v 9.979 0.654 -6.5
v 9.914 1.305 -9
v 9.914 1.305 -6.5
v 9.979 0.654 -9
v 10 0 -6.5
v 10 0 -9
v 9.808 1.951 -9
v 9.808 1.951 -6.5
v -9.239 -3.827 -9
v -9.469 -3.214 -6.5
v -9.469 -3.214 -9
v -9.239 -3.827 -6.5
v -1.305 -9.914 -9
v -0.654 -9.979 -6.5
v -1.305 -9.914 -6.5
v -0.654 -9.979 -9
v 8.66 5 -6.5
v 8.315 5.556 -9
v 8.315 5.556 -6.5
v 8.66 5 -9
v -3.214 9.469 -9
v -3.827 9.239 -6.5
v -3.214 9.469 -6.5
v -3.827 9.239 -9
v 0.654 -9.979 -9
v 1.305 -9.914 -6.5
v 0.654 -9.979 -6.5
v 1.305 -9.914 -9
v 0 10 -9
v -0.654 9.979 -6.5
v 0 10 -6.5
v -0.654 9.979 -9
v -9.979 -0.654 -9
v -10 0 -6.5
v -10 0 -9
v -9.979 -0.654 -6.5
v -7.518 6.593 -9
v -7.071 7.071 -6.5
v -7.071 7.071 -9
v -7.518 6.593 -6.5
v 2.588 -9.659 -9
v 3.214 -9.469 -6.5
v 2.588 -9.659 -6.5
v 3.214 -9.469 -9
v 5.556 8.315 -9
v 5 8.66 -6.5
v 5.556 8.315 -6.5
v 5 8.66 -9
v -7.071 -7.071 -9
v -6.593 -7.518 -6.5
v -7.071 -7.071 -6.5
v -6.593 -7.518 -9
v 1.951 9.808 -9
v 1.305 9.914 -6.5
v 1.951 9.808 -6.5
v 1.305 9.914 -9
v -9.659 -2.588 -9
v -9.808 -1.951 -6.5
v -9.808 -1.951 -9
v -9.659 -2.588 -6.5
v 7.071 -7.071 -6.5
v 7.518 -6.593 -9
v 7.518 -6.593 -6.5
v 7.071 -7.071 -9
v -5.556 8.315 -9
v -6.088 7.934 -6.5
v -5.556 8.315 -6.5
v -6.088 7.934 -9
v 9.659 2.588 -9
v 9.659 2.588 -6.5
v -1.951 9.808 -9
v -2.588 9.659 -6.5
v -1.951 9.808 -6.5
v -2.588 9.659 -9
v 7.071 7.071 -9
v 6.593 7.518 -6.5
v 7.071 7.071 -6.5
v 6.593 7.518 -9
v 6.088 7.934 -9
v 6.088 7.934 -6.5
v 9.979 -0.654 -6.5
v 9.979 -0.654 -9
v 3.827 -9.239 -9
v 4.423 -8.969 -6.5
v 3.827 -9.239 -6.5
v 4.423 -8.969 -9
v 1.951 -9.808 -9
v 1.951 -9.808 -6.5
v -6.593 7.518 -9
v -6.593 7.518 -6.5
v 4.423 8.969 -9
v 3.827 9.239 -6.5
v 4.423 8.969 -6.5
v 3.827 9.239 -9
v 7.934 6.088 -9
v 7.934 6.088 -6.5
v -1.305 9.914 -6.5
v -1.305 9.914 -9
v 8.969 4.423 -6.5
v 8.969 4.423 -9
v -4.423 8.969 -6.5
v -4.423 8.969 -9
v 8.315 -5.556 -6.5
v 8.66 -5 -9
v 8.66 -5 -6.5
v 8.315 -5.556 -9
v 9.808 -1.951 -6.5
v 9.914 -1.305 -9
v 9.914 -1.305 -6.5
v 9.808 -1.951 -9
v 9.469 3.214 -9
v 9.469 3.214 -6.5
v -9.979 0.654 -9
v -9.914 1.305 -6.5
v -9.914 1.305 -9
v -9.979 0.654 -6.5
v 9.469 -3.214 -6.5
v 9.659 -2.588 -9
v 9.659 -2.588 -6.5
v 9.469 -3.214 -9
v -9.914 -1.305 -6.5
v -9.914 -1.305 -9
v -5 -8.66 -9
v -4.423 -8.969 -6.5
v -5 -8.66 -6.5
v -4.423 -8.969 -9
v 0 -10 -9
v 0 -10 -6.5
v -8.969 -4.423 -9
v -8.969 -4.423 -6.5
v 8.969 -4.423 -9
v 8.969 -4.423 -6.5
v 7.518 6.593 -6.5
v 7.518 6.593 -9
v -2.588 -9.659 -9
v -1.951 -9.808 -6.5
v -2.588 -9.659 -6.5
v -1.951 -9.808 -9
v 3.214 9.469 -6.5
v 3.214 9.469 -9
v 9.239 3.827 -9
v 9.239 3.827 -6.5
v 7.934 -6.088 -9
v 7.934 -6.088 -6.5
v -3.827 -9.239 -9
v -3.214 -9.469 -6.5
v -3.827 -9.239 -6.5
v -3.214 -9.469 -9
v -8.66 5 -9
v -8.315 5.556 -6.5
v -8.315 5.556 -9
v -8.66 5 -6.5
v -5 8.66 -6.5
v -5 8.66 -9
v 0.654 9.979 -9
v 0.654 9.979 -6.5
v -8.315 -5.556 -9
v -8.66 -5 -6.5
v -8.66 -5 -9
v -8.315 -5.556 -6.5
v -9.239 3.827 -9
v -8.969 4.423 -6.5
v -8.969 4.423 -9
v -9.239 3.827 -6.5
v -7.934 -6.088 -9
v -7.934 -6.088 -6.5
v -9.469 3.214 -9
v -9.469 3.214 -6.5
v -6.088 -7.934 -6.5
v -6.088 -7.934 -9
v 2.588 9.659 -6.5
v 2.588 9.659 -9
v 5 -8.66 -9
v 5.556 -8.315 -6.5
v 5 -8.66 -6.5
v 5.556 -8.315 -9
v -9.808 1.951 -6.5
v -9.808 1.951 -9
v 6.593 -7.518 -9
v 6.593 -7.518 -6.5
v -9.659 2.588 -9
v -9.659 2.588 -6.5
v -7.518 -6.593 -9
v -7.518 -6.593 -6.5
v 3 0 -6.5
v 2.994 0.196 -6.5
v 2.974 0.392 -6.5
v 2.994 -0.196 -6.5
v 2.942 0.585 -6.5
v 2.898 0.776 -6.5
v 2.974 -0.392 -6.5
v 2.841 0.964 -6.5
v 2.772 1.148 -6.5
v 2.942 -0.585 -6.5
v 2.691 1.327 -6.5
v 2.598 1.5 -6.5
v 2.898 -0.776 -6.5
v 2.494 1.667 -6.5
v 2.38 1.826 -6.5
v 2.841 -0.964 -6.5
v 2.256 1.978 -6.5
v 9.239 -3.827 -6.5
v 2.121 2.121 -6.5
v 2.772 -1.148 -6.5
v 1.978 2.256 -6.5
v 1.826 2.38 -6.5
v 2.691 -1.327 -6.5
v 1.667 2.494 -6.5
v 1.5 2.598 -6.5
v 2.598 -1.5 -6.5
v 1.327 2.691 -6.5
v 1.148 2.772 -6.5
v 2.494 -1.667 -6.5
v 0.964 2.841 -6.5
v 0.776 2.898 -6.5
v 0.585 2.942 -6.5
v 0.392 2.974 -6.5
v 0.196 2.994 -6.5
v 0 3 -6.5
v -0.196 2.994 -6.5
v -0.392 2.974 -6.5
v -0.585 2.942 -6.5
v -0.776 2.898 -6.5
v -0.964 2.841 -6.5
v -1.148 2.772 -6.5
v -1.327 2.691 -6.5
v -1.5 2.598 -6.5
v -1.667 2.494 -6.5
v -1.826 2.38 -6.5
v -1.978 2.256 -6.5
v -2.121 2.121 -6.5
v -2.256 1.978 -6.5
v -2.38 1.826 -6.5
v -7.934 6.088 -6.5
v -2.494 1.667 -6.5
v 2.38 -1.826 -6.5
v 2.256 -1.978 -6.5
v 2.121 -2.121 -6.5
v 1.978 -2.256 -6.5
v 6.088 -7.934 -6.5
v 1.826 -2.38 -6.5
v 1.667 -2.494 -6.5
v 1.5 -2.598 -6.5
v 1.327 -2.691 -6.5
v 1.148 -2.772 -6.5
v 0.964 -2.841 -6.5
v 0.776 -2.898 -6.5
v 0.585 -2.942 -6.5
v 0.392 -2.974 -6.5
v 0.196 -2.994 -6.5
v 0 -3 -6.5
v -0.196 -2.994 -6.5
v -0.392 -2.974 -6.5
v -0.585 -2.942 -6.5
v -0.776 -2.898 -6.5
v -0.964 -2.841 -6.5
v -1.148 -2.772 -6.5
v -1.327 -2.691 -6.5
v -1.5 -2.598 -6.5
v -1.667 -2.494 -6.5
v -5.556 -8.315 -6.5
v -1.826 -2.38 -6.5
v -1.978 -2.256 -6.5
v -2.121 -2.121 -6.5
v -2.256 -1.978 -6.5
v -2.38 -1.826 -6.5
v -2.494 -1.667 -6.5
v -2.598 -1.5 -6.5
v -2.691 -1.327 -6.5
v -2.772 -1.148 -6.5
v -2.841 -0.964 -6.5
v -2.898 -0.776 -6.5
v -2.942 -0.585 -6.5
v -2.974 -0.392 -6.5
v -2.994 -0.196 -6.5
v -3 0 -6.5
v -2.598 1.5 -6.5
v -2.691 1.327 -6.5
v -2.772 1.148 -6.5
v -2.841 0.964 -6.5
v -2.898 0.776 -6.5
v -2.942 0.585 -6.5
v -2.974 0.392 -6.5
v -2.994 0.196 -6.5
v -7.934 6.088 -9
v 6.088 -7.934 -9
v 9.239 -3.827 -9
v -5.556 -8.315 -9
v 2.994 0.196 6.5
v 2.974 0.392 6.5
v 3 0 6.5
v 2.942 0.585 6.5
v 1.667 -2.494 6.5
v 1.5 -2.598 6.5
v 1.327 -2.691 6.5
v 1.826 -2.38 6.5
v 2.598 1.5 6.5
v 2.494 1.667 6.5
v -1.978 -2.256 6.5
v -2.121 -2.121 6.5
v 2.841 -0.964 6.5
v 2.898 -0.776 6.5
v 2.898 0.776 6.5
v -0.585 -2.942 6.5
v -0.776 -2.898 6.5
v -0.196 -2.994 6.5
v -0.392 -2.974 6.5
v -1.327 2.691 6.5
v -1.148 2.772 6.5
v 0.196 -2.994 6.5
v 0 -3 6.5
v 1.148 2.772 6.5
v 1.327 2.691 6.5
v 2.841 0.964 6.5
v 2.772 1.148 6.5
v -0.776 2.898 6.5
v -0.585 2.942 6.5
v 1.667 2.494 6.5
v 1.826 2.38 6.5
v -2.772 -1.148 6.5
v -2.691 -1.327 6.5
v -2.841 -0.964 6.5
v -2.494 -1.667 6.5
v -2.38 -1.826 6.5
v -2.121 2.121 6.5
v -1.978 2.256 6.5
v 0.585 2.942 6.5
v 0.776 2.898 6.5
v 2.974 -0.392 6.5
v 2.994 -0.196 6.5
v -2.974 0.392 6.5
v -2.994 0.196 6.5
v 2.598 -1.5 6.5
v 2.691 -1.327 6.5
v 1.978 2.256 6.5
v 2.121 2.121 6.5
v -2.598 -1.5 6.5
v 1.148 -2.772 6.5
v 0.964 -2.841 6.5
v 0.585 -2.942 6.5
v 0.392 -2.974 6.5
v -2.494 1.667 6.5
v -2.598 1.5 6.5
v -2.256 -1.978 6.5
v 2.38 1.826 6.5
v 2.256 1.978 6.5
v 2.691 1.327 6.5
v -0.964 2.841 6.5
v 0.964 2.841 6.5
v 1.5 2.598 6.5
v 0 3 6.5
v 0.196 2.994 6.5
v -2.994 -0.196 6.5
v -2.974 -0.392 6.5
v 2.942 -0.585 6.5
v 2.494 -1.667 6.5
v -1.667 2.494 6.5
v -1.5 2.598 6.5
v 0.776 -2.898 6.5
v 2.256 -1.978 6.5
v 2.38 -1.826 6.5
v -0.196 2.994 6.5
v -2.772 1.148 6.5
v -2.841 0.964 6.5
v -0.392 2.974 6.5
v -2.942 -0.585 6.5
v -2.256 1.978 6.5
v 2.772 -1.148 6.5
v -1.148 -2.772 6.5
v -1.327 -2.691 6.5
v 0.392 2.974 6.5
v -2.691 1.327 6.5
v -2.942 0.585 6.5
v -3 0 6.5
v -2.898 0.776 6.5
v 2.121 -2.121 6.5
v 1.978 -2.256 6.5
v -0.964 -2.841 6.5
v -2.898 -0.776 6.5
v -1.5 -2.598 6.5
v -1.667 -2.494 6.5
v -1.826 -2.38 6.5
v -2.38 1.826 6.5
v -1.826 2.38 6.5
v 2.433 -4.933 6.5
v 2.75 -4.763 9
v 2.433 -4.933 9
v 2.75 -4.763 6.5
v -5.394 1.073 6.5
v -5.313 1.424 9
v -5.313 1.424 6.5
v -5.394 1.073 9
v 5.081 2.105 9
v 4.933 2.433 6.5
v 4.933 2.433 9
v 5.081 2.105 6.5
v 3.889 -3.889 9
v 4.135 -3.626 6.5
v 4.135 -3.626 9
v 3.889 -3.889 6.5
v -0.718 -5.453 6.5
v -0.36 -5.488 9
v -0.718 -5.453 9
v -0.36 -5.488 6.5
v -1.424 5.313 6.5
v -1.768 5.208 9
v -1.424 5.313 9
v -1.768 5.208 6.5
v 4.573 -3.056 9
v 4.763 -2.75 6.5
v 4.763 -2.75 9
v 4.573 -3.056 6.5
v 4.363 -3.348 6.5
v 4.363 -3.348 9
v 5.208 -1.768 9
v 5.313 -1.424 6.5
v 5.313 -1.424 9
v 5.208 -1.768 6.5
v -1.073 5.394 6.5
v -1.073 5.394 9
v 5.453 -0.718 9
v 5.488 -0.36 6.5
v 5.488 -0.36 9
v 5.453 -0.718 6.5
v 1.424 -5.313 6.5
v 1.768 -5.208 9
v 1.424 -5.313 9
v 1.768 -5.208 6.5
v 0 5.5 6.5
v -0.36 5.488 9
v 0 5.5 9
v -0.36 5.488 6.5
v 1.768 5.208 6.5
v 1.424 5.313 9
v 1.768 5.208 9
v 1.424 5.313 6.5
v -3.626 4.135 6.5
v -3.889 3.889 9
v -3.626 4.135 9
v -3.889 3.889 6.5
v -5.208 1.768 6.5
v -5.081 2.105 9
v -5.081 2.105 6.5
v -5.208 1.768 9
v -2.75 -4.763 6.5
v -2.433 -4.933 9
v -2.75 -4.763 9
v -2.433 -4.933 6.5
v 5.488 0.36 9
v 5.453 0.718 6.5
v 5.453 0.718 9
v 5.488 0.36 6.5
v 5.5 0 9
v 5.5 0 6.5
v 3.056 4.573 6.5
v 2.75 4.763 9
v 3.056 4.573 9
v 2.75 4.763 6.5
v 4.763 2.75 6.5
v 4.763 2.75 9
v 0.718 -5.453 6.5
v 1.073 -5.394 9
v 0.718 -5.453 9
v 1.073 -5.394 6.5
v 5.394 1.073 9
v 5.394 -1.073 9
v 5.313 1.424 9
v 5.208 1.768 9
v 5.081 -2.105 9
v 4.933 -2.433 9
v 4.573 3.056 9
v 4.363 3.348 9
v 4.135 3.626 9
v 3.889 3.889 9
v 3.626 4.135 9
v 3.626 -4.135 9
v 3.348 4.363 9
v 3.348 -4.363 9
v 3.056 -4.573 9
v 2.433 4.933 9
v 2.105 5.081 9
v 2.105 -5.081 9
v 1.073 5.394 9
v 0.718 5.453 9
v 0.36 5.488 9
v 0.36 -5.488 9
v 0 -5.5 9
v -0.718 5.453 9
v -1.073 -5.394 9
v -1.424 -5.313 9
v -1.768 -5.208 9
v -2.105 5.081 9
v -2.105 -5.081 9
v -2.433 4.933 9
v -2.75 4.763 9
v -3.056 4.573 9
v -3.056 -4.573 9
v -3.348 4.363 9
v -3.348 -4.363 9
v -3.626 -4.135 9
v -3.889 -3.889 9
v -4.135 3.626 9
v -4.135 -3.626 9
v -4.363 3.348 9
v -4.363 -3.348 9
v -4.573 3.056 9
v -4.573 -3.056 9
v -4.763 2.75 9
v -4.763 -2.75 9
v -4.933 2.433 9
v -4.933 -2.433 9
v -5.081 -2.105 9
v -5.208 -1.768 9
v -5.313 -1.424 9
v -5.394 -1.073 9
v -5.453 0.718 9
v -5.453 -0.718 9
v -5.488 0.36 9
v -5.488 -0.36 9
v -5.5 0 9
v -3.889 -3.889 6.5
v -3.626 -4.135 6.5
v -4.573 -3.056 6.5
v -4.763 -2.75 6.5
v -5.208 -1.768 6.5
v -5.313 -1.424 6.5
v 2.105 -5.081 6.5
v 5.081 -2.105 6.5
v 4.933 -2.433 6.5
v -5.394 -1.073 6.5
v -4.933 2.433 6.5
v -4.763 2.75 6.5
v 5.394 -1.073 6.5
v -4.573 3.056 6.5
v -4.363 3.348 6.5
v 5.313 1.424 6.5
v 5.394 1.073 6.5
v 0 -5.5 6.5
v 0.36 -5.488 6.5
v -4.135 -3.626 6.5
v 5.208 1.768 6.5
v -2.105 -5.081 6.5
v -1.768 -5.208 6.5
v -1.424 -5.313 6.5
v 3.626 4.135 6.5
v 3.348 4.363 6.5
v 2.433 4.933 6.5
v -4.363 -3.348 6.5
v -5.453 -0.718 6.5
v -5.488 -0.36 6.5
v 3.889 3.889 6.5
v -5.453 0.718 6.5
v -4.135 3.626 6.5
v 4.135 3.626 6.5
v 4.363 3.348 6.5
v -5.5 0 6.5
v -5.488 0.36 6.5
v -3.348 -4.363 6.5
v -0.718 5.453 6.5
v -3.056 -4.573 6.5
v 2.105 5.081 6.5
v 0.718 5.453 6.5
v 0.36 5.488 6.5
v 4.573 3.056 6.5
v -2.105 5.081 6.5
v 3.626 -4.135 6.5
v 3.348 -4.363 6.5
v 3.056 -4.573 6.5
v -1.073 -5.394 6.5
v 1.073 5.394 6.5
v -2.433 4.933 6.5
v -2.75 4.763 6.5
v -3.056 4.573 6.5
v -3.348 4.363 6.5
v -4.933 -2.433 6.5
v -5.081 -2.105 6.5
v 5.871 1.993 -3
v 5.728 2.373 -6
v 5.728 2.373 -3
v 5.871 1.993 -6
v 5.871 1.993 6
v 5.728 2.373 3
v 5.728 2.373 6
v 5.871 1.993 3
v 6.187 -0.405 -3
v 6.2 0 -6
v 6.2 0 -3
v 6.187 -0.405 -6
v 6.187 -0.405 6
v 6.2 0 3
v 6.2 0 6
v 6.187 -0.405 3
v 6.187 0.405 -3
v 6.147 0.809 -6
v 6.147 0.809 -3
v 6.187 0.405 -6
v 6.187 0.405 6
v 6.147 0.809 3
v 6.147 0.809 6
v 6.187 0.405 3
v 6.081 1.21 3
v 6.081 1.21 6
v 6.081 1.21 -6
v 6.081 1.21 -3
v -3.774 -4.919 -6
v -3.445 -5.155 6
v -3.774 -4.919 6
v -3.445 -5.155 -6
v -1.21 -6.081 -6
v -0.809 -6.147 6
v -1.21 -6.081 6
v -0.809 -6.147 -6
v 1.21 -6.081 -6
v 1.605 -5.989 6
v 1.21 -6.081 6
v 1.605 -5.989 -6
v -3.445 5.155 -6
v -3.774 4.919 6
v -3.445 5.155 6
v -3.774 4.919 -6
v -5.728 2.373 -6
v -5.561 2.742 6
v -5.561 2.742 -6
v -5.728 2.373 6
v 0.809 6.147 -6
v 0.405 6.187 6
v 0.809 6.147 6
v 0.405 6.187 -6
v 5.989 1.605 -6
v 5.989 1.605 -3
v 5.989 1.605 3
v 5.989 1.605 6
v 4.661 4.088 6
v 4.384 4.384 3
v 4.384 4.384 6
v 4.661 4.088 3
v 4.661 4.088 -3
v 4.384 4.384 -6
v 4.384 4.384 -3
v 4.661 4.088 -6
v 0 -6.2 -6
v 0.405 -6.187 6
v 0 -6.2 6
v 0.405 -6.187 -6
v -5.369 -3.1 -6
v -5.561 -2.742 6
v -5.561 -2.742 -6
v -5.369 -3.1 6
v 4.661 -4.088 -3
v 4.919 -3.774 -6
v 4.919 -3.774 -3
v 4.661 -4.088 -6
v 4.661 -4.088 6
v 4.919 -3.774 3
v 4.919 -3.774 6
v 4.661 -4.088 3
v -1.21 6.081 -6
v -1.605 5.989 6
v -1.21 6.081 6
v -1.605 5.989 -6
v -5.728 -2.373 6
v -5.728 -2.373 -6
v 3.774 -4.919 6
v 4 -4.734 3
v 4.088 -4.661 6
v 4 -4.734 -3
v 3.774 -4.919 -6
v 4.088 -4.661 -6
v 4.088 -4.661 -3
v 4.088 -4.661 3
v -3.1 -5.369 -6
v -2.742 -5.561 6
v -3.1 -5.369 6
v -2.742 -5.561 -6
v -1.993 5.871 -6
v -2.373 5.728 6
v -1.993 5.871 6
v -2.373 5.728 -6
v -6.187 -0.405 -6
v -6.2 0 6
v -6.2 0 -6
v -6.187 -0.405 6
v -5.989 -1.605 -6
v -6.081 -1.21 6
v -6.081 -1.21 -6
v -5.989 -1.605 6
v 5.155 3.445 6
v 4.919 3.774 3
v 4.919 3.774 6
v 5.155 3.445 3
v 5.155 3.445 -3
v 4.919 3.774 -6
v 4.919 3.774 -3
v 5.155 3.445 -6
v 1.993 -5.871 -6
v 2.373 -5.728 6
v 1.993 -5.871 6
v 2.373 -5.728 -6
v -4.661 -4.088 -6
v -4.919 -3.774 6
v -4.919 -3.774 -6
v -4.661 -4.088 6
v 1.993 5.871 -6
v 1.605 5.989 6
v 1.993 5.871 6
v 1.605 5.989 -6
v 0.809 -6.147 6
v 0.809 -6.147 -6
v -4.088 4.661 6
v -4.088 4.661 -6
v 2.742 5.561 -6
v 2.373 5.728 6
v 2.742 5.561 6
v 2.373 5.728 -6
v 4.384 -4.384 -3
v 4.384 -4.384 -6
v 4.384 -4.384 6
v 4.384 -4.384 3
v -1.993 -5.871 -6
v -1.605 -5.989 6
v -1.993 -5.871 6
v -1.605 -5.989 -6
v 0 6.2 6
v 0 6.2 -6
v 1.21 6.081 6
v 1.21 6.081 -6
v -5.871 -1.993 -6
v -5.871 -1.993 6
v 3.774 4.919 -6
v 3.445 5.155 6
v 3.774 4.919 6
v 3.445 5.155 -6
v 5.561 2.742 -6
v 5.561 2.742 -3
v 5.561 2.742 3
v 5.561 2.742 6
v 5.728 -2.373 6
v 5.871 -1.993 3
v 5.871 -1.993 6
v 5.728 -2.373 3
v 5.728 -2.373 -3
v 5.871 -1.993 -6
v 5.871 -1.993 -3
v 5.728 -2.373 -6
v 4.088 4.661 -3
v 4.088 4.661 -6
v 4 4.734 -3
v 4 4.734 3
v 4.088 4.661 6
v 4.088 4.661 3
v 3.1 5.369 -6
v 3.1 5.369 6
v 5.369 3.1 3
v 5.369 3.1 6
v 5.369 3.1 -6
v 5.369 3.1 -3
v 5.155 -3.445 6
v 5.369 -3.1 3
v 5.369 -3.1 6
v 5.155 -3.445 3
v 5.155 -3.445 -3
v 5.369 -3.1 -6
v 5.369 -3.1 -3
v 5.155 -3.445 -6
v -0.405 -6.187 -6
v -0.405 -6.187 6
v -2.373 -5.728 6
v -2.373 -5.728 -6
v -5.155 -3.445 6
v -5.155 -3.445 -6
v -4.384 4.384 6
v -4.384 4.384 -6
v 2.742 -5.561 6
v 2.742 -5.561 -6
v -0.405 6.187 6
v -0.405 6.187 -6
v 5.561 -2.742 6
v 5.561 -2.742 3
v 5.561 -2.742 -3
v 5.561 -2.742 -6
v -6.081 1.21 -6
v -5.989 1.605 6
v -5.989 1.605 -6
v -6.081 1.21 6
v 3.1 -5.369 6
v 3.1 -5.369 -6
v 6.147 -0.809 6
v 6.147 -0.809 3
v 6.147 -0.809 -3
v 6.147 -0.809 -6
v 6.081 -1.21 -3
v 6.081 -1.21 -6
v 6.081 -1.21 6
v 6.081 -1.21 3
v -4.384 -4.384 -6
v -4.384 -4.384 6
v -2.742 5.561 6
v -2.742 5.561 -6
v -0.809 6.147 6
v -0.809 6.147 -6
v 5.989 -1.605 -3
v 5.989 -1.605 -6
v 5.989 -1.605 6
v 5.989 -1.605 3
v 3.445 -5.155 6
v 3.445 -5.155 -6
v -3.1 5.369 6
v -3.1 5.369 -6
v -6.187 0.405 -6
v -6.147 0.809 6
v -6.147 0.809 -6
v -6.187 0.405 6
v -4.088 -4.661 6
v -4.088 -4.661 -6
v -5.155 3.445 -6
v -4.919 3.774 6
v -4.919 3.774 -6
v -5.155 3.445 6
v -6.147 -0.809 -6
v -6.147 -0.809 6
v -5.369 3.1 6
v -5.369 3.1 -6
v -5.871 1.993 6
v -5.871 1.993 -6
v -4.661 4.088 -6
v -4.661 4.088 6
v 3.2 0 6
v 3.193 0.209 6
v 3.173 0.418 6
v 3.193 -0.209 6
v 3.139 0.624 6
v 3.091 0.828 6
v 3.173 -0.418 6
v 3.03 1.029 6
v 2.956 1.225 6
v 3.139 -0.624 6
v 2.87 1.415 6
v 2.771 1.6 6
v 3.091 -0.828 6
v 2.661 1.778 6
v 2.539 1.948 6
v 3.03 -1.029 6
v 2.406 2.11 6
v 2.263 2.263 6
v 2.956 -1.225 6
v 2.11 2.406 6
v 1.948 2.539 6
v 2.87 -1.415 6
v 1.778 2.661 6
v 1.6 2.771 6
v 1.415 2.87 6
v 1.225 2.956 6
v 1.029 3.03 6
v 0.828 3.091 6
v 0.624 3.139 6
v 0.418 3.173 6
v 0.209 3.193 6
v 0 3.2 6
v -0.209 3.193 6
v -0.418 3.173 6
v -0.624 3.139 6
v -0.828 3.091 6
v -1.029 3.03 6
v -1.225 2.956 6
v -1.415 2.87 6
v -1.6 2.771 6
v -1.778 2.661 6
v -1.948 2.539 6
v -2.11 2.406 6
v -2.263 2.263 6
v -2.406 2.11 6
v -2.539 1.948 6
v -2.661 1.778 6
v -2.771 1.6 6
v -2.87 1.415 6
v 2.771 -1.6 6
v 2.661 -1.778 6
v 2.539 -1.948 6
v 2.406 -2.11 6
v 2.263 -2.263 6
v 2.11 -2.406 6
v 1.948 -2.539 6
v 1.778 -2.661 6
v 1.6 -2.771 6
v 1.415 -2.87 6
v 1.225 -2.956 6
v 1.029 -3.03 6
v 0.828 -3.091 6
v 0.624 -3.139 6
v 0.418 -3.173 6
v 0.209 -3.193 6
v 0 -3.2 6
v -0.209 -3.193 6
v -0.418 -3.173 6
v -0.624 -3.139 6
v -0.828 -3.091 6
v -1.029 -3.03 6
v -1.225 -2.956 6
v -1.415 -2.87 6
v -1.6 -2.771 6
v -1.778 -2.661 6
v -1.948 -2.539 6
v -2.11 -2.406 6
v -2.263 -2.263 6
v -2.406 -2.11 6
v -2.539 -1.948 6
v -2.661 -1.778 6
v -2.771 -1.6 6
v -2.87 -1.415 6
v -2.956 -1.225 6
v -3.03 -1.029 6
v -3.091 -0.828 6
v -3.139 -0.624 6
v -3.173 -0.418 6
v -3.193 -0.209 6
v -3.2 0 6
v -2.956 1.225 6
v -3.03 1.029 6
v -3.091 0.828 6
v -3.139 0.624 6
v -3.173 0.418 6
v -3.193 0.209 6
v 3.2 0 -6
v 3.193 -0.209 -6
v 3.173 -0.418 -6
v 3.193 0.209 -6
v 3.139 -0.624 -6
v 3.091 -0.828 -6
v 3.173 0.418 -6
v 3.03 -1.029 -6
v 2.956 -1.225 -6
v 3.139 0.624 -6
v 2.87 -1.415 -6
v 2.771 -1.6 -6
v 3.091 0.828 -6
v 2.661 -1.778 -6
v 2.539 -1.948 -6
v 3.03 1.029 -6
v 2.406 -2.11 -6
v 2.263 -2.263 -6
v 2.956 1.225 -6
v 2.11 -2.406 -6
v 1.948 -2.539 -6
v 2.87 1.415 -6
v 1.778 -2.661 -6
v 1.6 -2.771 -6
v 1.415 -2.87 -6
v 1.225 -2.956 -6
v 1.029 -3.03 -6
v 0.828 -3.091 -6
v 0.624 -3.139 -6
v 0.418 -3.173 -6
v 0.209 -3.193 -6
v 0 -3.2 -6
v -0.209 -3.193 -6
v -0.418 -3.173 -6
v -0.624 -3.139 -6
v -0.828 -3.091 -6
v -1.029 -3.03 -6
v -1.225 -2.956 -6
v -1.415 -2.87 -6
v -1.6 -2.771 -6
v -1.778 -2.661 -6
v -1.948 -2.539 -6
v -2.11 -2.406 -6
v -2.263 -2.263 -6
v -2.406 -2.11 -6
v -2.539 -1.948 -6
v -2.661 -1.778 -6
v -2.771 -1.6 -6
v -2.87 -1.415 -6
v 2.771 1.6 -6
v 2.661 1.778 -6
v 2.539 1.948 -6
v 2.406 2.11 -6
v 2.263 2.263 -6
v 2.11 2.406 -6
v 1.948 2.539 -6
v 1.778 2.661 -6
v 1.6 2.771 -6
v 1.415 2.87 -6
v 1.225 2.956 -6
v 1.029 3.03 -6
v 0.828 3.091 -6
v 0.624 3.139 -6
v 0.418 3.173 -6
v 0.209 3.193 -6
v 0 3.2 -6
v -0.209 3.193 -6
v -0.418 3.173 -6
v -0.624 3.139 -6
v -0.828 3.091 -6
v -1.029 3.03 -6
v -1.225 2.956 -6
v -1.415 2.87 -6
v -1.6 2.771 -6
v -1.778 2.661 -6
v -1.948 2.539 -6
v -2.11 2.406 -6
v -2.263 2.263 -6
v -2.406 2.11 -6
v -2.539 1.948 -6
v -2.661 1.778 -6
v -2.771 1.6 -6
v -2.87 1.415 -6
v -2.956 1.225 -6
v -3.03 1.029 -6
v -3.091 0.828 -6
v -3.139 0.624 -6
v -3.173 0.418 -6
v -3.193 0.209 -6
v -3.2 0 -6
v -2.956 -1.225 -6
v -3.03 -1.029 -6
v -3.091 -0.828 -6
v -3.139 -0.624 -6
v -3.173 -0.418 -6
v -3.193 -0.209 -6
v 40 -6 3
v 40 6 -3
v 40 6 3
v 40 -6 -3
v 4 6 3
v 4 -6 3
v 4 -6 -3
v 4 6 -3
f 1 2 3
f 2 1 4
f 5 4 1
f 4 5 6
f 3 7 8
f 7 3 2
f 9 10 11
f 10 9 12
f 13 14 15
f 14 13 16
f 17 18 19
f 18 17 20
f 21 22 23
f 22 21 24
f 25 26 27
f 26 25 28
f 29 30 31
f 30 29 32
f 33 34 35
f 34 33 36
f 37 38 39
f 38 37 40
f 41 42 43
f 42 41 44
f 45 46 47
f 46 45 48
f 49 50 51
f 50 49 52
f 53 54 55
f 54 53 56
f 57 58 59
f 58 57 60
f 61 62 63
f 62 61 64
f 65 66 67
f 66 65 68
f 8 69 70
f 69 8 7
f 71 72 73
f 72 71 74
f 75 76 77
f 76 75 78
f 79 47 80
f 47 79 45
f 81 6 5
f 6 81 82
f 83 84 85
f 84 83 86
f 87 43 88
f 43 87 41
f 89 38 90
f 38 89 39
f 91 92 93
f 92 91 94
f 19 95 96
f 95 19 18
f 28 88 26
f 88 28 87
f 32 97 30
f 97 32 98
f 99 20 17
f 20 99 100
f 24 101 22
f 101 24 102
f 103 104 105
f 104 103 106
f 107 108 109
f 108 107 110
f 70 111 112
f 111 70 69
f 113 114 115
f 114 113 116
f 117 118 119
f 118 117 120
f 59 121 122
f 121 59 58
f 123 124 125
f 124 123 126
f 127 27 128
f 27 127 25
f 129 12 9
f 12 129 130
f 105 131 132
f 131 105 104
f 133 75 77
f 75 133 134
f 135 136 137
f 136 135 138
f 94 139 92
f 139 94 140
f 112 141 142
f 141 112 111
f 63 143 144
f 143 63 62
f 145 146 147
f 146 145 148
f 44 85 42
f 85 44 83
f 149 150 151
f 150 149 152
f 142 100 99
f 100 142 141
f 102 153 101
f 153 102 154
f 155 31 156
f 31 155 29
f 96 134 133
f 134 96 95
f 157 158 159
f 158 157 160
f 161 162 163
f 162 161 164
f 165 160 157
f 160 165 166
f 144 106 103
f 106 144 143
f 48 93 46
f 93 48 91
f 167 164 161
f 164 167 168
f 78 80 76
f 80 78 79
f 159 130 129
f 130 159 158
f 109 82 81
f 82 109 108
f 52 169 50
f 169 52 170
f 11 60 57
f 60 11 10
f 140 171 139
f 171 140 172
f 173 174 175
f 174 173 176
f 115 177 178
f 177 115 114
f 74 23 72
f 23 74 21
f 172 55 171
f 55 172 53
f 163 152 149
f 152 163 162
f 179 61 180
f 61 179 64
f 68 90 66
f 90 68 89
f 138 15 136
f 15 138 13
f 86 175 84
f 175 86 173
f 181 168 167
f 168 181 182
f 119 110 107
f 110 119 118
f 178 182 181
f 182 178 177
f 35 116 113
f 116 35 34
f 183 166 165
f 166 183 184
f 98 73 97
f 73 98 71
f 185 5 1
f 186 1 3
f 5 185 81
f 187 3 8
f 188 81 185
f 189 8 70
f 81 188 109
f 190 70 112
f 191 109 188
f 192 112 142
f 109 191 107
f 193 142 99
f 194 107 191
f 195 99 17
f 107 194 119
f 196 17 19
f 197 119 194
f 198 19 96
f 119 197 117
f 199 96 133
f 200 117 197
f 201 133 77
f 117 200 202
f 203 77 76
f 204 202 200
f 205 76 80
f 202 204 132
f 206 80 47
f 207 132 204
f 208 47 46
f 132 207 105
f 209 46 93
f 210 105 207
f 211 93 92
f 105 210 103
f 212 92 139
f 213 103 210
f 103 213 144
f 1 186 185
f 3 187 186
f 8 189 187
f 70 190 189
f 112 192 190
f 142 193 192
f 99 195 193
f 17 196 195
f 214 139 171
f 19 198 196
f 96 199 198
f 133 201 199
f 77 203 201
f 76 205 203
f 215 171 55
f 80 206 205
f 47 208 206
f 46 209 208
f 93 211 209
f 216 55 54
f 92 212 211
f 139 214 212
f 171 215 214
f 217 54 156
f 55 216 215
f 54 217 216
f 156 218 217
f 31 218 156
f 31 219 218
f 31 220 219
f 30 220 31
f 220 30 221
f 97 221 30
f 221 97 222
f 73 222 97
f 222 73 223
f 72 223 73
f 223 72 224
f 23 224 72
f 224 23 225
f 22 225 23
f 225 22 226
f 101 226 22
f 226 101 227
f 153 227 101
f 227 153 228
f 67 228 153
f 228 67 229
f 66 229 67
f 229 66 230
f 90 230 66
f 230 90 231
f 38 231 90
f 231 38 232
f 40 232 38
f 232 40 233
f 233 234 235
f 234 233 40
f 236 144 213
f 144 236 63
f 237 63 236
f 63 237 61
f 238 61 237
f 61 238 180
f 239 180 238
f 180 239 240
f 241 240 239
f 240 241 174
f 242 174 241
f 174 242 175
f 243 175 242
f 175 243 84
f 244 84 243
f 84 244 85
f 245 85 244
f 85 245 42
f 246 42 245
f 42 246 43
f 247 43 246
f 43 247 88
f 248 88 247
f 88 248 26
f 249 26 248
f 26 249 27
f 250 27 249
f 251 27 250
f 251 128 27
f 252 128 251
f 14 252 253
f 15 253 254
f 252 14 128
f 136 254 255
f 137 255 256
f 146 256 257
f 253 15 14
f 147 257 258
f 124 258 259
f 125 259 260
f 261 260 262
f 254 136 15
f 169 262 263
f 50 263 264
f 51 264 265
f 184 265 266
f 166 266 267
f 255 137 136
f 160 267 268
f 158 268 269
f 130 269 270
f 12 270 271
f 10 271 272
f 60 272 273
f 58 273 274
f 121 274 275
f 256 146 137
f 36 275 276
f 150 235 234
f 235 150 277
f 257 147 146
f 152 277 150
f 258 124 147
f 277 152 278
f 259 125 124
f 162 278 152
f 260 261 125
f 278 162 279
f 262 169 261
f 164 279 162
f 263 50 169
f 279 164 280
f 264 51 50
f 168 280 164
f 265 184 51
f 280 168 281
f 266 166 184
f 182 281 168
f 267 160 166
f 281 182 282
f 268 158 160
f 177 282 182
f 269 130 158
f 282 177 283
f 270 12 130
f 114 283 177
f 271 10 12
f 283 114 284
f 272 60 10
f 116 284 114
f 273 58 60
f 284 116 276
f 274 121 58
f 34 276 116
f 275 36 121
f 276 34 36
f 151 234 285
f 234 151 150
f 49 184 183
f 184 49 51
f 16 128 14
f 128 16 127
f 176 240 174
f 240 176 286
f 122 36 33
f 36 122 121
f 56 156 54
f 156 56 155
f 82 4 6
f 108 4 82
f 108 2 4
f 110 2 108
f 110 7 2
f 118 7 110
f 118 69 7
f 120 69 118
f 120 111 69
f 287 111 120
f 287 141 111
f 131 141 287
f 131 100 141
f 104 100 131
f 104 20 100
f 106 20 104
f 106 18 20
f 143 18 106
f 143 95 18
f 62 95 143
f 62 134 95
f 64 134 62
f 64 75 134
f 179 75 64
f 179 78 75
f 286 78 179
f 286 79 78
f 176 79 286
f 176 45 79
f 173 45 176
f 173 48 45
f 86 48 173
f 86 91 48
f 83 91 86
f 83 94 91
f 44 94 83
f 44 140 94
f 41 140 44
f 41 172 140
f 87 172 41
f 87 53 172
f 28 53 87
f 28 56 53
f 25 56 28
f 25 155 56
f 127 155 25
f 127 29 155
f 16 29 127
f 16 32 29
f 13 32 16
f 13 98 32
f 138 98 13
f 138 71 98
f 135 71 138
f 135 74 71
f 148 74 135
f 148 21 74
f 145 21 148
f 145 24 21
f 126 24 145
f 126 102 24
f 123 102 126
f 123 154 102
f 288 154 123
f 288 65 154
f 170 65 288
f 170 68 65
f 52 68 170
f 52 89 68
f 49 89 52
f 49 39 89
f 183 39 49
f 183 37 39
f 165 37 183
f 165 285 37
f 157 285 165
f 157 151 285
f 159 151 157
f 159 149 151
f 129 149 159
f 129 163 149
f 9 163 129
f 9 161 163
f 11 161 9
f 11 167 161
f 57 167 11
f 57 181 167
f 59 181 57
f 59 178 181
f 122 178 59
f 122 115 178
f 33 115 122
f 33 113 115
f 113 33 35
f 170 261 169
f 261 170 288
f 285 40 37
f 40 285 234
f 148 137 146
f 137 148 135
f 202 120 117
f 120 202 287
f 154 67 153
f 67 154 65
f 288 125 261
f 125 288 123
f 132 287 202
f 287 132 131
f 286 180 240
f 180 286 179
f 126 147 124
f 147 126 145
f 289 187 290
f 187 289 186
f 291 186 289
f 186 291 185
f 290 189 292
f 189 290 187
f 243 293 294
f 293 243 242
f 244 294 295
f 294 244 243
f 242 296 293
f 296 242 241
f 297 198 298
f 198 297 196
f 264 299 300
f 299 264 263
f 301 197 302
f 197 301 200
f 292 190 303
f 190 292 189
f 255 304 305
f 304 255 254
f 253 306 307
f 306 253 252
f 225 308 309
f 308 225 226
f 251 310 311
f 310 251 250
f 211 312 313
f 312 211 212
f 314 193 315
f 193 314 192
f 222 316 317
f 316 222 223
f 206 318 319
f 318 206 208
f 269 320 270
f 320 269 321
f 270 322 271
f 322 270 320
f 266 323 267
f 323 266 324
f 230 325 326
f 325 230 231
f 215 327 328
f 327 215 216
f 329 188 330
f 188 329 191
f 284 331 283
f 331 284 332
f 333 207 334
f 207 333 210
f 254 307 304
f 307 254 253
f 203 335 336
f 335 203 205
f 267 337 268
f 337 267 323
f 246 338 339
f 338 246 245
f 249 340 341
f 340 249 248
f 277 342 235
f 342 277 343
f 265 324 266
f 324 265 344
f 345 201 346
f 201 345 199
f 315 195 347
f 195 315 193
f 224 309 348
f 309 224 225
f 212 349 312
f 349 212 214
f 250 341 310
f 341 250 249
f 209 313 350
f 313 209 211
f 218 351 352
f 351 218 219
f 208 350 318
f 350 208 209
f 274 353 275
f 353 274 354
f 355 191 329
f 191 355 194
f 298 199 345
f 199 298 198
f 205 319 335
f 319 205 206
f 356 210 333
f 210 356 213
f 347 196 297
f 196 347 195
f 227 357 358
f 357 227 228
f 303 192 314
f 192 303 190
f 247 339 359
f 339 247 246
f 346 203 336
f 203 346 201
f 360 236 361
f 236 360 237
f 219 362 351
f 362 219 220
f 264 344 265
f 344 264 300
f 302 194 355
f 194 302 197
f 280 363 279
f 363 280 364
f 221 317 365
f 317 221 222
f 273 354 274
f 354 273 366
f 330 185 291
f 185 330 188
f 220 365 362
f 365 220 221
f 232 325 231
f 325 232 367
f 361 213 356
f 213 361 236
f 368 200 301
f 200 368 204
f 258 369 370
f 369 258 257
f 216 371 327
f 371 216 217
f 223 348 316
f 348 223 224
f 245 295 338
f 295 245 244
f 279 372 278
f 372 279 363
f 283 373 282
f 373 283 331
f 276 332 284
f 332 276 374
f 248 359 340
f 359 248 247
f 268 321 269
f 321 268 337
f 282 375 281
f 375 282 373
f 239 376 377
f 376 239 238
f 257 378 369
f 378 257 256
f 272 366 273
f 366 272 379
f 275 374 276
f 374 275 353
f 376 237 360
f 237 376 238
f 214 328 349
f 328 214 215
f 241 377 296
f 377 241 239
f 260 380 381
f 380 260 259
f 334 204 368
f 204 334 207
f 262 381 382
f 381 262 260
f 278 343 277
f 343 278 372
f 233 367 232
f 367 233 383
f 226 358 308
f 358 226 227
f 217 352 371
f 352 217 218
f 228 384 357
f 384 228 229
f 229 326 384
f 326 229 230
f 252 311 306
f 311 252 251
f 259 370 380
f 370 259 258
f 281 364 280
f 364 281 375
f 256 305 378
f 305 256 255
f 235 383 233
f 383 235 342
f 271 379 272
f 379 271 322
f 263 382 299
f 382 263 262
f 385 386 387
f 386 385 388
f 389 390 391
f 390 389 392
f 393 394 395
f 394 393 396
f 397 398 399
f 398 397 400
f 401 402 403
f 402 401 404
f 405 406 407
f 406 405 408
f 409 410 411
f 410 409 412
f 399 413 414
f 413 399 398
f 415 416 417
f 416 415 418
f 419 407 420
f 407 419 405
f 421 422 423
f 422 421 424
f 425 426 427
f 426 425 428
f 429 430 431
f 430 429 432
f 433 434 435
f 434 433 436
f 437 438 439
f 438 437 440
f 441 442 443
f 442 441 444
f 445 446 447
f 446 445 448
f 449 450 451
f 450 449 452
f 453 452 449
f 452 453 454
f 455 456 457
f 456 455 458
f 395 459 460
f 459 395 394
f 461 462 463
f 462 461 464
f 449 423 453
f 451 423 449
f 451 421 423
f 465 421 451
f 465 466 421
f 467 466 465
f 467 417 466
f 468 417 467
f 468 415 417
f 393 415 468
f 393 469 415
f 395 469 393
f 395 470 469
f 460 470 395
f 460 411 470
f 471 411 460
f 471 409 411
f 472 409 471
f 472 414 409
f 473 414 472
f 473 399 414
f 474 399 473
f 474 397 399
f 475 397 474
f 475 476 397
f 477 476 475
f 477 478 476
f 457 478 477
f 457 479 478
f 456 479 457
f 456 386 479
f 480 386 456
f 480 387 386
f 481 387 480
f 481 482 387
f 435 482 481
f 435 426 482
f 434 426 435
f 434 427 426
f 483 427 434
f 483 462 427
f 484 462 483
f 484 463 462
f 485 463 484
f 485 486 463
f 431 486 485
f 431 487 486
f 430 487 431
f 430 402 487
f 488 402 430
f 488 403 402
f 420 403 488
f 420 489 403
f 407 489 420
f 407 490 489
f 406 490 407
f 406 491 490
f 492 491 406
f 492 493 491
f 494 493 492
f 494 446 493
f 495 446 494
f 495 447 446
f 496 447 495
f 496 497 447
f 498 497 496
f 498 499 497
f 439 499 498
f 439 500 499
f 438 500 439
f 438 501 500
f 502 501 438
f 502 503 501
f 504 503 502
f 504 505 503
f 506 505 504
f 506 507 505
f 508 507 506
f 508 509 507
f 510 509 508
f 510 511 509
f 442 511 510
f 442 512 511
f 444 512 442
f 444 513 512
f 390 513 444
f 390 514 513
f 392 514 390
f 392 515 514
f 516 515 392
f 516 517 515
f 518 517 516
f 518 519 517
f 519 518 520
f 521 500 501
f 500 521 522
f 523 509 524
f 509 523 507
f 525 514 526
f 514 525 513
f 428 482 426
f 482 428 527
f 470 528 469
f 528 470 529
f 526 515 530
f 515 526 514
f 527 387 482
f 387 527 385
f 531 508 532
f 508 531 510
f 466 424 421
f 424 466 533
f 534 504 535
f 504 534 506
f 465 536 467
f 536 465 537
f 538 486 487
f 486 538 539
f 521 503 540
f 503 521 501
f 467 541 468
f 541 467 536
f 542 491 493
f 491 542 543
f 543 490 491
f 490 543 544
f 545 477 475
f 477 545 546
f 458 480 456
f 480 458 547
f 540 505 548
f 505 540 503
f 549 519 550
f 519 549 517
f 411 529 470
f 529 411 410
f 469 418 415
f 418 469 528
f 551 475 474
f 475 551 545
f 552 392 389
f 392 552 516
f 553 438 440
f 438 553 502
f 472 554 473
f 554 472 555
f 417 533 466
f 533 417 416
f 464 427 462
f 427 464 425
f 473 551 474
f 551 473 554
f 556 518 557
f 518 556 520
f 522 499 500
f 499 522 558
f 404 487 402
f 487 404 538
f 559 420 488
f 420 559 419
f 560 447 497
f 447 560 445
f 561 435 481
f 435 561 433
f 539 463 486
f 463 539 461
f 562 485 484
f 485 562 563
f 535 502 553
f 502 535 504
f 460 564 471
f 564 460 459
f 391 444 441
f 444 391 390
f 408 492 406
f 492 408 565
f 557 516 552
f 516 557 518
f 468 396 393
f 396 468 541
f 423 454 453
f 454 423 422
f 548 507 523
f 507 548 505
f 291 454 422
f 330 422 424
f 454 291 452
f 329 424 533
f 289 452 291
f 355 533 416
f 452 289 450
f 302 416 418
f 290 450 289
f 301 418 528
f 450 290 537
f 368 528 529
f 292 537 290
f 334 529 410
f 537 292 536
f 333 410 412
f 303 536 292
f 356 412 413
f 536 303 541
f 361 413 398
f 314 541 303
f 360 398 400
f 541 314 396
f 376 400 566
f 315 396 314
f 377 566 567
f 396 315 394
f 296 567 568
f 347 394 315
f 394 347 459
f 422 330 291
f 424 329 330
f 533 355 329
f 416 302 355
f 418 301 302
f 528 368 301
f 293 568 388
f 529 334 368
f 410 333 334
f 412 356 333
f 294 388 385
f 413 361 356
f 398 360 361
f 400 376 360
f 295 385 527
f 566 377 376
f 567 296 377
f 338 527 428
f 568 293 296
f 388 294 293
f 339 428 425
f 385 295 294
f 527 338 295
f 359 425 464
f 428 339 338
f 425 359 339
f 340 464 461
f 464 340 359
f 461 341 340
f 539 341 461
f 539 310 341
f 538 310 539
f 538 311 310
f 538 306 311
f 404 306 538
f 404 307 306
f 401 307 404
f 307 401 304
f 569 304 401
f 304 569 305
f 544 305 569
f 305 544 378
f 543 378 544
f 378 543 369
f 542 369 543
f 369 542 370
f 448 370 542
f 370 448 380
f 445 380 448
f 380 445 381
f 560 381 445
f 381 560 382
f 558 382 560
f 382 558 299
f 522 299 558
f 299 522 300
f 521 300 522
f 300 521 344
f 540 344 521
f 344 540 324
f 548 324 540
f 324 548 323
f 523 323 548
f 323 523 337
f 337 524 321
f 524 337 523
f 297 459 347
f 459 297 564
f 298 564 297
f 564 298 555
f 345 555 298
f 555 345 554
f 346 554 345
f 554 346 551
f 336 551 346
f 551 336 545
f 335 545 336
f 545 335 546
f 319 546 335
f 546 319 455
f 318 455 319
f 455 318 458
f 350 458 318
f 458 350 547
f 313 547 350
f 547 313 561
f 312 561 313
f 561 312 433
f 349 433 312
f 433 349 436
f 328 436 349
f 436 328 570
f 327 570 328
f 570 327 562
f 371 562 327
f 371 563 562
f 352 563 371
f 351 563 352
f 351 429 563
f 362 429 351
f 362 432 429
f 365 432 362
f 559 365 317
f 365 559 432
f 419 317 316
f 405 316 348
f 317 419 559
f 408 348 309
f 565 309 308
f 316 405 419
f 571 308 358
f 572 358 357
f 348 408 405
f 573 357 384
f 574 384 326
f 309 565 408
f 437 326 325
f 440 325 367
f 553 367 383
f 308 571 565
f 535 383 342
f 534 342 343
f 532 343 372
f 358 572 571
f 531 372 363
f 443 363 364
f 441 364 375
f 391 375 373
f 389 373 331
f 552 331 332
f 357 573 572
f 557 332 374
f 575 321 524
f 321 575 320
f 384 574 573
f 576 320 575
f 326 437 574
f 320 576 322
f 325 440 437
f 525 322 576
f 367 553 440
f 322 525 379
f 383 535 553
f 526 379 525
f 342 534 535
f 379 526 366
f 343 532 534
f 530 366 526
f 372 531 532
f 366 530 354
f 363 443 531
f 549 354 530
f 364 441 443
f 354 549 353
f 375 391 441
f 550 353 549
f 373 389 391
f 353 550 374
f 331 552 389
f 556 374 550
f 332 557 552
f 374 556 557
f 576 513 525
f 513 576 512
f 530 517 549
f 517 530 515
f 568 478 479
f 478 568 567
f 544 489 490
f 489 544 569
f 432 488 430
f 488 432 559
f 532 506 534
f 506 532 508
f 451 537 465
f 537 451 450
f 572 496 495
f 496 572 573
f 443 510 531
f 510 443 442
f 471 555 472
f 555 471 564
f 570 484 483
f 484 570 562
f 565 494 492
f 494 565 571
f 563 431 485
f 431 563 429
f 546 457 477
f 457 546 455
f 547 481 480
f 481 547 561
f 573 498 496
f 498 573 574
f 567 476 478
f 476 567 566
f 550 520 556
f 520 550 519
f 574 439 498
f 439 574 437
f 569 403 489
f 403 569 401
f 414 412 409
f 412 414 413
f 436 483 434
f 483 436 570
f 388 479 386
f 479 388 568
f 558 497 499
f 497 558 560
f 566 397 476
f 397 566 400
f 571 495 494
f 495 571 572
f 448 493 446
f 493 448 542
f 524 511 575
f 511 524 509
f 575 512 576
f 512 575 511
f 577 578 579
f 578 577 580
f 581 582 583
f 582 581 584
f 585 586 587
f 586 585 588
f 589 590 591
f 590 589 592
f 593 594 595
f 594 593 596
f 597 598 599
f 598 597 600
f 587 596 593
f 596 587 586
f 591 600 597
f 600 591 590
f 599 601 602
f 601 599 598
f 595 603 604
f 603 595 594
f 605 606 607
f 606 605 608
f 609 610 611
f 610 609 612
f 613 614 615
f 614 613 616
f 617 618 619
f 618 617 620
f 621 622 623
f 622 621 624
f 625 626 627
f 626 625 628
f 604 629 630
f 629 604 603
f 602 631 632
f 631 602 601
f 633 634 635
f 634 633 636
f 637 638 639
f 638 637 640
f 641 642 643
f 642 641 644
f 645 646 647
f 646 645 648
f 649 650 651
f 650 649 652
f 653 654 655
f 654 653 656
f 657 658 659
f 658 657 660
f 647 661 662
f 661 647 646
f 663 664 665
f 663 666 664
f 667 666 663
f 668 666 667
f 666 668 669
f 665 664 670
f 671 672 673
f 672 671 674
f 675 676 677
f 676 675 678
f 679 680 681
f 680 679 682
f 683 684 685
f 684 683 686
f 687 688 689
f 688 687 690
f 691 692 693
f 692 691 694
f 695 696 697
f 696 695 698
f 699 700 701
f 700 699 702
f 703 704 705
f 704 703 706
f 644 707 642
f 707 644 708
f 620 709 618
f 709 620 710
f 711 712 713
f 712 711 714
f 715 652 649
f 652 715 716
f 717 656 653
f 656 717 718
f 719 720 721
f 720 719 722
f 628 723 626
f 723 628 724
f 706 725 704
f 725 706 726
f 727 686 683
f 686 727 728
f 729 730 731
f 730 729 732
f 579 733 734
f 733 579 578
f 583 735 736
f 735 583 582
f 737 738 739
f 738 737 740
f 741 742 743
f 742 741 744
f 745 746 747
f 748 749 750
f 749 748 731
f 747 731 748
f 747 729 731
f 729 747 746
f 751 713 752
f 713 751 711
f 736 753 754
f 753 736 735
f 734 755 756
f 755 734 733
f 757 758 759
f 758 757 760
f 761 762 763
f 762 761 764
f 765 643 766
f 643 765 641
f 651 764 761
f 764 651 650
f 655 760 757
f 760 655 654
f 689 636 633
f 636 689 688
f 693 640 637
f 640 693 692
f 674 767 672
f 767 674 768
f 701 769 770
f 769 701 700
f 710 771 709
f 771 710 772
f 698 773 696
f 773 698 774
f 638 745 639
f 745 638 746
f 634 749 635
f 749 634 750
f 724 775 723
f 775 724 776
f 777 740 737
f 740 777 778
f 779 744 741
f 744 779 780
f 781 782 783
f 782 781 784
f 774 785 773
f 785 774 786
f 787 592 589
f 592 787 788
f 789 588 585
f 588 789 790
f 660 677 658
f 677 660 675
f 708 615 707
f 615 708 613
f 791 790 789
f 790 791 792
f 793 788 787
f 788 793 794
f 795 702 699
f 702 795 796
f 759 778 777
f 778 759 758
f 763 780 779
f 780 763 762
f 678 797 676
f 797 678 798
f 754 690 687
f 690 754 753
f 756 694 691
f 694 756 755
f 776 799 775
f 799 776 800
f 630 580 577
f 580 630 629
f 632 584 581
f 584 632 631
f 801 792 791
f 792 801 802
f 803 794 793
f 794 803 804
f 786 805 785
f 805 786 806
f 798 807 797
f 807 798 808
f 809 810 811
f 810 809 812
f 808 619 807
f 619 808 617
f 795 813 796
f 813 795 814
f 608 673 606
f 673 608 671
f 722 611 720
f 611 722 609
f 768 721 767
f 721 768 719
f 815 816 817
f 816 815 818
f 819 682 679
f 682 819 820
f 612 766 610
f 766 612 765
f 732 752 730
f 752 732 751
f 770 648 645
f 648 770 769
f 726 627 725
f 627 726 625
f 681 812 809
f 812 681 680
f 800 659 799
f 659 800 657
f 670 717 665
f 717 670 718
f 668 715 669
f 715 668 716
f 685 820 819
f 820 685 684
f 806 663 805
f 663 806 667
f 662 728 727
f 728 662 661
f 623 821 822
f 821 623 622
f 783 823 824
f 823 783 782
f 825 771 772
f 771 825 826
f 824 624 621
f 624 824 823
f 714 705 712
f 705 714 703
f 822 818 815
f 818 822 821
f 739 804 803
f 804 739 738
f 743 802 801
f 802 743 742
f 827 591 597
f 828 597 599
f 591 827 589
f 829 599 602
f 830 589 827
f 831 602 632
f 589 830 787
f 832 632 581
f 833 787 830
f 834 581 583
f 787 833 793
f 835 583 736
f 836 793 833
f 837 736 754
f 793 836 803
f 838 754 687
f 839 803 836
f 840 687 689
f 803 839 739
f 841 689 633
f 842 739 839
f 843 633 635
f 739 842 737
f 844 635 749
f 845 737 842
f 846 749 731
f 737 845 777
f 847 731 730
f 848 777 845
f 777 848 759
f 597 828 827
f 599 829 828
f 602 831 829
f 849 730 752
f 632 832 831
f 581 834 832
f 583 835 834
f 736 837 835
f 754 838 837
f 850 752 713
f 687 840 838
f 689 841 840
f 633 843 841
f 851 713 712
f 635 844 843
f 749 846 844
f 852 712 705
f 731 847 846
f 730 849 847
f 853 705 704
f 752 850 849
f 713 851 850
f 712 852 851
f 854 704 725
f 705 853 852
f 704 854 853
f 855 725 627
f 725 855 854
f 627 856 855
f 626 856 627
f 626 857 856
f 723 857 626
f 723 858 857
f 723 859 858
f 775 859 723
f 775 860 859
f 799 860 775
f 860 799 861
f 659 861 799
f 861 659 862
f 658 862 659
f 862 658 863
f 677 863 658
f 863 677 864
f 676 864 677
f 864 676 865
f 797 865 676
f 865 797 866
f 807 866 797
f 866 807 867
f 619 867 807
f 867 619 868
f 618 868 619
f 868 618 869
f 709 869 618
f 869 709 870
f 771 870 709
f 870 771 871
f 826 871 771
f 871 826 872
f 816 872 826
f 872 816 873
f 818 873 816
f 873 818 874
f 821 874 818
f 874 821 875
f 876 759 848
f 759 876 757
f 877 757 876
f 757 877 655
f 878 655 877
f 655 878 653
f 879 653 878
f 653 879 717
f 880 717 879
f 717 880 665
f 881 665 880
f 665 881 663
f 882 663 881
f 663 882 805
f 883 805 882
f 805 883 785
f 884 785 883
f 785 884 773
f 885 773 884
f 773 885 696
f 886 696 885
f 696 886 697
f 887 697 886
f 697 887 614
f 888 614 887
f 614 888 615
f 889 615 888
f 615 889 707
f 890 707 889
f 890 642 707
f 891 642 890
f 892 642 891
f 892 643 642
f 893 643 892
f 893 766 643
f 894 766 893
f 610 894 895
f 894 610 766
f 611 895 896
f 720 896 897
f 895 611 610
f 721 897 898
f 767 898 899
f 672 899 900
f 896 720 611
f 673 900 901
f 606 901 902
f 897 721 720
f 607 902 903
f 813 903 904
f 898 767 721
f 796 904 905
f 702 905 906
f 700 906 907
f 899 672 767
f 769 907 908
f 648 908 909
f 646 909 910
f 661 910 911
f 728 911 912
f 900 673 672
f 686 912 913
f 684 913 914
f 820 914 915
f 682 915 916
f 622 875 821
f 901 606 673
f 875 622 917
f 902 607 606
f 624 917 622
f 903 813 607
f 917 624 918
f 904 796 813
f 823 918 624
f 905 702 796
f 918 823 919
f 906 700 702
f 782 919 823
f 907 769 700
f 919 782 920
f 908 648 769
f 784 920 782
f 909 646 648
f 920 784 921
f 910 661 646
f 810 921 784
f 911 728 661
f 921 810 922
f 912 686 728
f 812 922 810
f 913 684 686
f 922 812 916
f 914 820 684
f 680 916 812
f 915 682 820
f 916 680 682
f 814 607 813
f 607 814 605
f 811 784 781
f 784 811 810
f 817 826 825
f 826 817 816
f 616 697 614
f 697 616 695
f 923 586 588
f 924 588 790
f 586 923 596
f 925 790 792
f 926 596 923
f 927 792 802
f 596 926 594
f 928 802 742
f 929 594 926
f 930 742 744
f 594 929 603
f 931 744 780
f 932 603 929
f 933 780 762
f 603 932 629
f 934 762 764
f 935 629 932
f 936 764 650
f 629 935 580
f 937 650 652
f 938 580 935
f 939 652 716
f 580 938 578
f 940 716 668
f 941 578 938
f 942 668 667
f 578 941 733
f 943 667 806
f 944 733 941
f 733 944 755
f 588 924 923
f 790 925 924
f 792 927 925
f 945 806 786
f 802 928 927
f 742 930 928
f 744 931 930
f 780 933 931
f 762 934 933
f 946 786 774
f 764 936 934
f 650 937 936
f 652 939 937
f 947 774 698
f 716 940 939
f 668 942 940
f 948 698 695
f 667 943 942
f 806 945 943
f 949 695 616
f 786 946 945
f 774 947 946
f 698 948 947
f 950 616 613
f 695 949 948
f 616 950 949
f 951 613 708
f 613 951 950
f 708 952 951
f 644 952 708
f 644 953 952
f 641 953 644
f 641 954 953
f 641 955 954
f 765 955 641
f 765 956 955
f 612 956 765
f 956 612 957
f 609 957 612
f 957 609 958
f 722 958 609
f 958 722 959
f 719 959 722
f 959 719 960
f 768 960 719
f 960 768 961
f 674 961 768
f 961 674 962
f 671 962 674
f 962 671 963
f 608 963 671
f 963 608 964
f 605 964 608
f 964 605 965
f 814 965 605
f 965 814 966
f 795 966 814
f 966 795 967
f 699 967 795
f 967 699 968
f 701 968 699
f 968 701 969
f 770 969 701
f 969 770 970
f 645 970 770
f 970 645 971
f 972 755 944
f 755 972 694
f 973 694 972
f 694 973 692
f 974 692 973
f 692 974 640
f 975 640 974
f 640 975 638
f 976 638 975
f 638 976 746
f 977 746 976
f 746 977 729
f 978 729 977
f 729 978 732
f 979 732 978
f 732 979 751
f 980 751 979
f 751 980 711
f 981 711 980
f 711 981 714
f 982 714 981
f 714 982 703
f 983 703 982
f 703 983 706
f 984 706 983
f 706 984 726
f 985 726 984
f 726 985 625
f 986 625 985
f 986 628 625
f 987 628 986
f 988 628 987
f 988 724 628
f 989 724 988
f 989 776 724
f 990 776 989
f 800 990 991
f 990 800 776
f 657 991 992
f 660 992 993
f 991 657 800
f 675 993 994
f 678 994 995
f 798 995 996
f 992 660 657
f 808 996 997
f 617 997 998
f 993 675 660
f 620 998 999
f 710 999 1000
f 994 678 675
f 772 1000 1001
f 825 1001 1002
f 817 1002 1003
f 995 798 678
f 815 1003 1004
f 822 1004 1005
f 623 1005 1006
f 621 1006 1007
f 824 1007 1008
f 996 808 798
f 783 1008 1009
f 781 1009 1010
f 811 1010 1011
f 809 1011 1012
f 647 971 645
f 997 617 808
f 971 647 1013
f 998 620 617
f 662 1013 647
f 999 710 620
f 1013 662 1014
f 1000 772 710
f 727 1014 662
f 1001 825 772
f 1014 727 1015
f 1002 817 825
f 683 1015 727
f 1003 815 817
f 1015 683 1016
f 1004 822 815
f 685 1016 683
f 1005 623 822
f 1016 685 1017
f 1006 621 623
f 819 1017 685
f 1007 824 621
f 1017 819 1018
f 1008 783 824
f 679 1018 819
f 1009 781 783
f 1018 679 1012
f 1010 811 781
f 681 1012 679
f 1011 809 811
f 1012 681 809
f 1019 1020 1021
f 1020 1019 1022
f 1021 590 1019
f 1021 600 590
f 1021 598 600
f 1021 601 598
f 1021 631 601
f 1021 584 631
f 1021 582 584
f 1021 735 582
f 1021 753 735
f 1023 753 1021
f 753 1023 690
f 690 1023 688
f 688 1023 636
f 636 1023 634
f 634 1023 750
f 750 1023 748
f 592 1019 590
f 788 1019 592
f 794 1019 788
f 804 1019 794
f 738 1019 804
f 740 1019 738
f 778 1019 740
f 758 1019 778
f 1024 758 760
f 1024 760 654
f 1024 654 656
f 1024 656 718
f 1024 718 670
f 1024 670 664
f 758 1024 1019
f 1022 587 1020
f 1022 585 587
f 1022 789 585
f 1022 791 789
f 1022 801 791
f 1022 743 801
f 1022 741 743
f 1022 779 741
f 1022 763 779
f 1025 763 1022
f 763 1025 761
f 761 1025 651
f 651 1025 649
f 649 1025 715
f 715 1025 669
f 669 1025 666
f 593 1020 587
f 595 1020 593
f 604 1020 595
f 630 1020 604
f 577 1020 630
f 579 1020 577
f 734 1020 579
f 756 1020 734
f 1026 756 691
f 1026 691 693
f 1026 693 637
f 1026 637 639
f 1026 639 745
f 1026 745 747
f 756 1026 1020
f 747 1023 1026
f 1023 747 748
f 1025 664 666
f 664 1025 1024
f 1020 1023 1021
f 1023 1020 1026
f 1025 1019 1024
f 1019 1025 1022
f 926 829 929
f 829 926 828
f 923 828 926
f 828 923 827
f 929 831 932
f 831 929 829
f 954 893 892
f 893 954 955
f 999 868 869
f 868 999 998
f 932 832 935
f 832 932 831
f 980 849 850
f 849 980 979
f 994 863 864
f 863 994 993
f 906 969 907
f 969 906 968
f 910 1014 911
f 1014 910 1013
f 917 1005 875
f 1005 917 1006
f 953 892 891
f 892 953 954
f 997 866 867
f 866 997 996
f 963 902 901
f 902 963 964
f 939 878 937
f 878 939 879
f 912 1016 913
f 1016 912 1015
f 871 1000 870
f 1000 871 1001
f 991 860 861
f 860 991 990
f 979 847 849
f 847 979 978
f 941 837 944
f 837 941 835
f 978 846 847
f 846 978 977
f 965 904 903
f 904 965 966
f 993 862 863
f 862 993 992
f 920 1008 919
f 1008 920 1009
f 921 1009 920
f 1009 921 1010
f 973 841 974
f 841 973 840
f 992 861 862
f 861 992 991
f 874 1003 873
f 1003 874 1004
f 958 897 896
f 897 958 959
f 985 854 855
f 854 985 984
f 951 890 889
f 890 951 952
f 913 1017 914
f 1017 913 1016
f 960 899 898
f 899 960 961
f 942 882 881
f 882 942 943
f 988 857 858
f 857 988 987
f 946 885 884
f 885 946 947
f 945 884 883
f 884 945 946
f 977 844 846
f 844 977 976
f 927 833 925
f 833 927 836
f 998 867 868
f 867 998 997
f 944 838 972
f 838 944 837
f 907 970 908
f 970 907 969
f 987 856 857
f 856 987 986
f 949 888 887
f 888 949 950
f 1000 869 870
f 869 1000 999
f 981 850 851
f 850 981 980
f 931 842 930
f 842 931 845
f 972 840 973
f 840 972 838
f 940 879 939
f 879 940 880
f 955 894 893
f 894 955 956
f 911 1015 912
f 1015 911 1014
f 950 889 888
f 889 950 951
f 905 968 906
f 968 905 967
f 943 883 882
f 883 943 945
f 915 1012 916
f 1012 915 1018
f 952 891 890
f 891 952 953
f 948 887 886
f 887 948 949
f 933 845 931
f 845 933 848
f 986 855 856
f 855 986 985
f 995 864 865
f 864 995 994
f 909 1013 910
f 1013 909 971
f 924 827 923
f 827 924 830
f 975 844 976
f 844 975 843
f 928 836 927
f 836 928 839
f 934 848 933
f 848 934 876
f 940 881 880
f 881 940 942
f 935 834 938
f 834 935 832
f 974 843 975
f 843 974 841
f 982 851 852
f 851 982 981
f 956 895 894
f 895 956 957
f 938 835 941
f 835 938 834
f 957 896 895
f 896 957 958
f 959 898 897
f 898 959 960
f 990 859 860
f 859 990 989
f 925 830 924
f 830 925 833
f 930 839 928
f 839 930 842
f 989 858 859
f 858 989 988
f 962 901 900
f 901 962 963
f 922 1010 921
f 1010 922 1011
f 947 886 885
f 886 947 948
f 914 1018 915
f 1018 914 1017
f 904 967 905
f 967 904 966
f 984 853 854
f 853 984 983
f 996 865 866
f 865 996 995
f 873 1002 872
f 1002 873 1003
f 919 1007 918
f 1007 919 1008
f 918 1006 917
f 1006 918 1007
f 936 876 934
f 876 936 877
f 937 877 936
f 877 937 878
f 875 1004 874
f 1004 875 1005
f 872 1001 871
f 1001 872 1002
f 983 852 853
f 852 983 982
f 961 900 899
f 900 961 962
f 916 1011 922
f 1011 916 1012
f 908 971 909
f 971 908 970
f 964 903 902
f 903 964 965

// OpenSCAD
agentscad_part = "all";
hinge_angle = 0;
$fn = 96;

module fixed_part() {
    union() {
        translate([0, 0, -9])
            cylinder(h = 2.5, r = 10);

        translate([0, 0, -9])
            cylinder(h = 16, r = 3);

        translate([0, 0, 6.5])
            cylinder(h = 2.5, r = 5.5);
    }
}

module moving_part() {
    rotate([0, 0, hinge_angle]) {
        difference() {
            union() {
                cylinder(h = 12, r = 6.2, center = true);
                translate([4, -6, -3])
                    cube([36, 12, 6]);
            }
            cylinder(h = 14, r = 3.2, center = true);
        }
    }
}

if (agentscad_part == "all" || agentscad_part == "fixed")
    fixed_part();

if (agentscad_part == "all" || agentscad_part == "moving")
    moving_part();
